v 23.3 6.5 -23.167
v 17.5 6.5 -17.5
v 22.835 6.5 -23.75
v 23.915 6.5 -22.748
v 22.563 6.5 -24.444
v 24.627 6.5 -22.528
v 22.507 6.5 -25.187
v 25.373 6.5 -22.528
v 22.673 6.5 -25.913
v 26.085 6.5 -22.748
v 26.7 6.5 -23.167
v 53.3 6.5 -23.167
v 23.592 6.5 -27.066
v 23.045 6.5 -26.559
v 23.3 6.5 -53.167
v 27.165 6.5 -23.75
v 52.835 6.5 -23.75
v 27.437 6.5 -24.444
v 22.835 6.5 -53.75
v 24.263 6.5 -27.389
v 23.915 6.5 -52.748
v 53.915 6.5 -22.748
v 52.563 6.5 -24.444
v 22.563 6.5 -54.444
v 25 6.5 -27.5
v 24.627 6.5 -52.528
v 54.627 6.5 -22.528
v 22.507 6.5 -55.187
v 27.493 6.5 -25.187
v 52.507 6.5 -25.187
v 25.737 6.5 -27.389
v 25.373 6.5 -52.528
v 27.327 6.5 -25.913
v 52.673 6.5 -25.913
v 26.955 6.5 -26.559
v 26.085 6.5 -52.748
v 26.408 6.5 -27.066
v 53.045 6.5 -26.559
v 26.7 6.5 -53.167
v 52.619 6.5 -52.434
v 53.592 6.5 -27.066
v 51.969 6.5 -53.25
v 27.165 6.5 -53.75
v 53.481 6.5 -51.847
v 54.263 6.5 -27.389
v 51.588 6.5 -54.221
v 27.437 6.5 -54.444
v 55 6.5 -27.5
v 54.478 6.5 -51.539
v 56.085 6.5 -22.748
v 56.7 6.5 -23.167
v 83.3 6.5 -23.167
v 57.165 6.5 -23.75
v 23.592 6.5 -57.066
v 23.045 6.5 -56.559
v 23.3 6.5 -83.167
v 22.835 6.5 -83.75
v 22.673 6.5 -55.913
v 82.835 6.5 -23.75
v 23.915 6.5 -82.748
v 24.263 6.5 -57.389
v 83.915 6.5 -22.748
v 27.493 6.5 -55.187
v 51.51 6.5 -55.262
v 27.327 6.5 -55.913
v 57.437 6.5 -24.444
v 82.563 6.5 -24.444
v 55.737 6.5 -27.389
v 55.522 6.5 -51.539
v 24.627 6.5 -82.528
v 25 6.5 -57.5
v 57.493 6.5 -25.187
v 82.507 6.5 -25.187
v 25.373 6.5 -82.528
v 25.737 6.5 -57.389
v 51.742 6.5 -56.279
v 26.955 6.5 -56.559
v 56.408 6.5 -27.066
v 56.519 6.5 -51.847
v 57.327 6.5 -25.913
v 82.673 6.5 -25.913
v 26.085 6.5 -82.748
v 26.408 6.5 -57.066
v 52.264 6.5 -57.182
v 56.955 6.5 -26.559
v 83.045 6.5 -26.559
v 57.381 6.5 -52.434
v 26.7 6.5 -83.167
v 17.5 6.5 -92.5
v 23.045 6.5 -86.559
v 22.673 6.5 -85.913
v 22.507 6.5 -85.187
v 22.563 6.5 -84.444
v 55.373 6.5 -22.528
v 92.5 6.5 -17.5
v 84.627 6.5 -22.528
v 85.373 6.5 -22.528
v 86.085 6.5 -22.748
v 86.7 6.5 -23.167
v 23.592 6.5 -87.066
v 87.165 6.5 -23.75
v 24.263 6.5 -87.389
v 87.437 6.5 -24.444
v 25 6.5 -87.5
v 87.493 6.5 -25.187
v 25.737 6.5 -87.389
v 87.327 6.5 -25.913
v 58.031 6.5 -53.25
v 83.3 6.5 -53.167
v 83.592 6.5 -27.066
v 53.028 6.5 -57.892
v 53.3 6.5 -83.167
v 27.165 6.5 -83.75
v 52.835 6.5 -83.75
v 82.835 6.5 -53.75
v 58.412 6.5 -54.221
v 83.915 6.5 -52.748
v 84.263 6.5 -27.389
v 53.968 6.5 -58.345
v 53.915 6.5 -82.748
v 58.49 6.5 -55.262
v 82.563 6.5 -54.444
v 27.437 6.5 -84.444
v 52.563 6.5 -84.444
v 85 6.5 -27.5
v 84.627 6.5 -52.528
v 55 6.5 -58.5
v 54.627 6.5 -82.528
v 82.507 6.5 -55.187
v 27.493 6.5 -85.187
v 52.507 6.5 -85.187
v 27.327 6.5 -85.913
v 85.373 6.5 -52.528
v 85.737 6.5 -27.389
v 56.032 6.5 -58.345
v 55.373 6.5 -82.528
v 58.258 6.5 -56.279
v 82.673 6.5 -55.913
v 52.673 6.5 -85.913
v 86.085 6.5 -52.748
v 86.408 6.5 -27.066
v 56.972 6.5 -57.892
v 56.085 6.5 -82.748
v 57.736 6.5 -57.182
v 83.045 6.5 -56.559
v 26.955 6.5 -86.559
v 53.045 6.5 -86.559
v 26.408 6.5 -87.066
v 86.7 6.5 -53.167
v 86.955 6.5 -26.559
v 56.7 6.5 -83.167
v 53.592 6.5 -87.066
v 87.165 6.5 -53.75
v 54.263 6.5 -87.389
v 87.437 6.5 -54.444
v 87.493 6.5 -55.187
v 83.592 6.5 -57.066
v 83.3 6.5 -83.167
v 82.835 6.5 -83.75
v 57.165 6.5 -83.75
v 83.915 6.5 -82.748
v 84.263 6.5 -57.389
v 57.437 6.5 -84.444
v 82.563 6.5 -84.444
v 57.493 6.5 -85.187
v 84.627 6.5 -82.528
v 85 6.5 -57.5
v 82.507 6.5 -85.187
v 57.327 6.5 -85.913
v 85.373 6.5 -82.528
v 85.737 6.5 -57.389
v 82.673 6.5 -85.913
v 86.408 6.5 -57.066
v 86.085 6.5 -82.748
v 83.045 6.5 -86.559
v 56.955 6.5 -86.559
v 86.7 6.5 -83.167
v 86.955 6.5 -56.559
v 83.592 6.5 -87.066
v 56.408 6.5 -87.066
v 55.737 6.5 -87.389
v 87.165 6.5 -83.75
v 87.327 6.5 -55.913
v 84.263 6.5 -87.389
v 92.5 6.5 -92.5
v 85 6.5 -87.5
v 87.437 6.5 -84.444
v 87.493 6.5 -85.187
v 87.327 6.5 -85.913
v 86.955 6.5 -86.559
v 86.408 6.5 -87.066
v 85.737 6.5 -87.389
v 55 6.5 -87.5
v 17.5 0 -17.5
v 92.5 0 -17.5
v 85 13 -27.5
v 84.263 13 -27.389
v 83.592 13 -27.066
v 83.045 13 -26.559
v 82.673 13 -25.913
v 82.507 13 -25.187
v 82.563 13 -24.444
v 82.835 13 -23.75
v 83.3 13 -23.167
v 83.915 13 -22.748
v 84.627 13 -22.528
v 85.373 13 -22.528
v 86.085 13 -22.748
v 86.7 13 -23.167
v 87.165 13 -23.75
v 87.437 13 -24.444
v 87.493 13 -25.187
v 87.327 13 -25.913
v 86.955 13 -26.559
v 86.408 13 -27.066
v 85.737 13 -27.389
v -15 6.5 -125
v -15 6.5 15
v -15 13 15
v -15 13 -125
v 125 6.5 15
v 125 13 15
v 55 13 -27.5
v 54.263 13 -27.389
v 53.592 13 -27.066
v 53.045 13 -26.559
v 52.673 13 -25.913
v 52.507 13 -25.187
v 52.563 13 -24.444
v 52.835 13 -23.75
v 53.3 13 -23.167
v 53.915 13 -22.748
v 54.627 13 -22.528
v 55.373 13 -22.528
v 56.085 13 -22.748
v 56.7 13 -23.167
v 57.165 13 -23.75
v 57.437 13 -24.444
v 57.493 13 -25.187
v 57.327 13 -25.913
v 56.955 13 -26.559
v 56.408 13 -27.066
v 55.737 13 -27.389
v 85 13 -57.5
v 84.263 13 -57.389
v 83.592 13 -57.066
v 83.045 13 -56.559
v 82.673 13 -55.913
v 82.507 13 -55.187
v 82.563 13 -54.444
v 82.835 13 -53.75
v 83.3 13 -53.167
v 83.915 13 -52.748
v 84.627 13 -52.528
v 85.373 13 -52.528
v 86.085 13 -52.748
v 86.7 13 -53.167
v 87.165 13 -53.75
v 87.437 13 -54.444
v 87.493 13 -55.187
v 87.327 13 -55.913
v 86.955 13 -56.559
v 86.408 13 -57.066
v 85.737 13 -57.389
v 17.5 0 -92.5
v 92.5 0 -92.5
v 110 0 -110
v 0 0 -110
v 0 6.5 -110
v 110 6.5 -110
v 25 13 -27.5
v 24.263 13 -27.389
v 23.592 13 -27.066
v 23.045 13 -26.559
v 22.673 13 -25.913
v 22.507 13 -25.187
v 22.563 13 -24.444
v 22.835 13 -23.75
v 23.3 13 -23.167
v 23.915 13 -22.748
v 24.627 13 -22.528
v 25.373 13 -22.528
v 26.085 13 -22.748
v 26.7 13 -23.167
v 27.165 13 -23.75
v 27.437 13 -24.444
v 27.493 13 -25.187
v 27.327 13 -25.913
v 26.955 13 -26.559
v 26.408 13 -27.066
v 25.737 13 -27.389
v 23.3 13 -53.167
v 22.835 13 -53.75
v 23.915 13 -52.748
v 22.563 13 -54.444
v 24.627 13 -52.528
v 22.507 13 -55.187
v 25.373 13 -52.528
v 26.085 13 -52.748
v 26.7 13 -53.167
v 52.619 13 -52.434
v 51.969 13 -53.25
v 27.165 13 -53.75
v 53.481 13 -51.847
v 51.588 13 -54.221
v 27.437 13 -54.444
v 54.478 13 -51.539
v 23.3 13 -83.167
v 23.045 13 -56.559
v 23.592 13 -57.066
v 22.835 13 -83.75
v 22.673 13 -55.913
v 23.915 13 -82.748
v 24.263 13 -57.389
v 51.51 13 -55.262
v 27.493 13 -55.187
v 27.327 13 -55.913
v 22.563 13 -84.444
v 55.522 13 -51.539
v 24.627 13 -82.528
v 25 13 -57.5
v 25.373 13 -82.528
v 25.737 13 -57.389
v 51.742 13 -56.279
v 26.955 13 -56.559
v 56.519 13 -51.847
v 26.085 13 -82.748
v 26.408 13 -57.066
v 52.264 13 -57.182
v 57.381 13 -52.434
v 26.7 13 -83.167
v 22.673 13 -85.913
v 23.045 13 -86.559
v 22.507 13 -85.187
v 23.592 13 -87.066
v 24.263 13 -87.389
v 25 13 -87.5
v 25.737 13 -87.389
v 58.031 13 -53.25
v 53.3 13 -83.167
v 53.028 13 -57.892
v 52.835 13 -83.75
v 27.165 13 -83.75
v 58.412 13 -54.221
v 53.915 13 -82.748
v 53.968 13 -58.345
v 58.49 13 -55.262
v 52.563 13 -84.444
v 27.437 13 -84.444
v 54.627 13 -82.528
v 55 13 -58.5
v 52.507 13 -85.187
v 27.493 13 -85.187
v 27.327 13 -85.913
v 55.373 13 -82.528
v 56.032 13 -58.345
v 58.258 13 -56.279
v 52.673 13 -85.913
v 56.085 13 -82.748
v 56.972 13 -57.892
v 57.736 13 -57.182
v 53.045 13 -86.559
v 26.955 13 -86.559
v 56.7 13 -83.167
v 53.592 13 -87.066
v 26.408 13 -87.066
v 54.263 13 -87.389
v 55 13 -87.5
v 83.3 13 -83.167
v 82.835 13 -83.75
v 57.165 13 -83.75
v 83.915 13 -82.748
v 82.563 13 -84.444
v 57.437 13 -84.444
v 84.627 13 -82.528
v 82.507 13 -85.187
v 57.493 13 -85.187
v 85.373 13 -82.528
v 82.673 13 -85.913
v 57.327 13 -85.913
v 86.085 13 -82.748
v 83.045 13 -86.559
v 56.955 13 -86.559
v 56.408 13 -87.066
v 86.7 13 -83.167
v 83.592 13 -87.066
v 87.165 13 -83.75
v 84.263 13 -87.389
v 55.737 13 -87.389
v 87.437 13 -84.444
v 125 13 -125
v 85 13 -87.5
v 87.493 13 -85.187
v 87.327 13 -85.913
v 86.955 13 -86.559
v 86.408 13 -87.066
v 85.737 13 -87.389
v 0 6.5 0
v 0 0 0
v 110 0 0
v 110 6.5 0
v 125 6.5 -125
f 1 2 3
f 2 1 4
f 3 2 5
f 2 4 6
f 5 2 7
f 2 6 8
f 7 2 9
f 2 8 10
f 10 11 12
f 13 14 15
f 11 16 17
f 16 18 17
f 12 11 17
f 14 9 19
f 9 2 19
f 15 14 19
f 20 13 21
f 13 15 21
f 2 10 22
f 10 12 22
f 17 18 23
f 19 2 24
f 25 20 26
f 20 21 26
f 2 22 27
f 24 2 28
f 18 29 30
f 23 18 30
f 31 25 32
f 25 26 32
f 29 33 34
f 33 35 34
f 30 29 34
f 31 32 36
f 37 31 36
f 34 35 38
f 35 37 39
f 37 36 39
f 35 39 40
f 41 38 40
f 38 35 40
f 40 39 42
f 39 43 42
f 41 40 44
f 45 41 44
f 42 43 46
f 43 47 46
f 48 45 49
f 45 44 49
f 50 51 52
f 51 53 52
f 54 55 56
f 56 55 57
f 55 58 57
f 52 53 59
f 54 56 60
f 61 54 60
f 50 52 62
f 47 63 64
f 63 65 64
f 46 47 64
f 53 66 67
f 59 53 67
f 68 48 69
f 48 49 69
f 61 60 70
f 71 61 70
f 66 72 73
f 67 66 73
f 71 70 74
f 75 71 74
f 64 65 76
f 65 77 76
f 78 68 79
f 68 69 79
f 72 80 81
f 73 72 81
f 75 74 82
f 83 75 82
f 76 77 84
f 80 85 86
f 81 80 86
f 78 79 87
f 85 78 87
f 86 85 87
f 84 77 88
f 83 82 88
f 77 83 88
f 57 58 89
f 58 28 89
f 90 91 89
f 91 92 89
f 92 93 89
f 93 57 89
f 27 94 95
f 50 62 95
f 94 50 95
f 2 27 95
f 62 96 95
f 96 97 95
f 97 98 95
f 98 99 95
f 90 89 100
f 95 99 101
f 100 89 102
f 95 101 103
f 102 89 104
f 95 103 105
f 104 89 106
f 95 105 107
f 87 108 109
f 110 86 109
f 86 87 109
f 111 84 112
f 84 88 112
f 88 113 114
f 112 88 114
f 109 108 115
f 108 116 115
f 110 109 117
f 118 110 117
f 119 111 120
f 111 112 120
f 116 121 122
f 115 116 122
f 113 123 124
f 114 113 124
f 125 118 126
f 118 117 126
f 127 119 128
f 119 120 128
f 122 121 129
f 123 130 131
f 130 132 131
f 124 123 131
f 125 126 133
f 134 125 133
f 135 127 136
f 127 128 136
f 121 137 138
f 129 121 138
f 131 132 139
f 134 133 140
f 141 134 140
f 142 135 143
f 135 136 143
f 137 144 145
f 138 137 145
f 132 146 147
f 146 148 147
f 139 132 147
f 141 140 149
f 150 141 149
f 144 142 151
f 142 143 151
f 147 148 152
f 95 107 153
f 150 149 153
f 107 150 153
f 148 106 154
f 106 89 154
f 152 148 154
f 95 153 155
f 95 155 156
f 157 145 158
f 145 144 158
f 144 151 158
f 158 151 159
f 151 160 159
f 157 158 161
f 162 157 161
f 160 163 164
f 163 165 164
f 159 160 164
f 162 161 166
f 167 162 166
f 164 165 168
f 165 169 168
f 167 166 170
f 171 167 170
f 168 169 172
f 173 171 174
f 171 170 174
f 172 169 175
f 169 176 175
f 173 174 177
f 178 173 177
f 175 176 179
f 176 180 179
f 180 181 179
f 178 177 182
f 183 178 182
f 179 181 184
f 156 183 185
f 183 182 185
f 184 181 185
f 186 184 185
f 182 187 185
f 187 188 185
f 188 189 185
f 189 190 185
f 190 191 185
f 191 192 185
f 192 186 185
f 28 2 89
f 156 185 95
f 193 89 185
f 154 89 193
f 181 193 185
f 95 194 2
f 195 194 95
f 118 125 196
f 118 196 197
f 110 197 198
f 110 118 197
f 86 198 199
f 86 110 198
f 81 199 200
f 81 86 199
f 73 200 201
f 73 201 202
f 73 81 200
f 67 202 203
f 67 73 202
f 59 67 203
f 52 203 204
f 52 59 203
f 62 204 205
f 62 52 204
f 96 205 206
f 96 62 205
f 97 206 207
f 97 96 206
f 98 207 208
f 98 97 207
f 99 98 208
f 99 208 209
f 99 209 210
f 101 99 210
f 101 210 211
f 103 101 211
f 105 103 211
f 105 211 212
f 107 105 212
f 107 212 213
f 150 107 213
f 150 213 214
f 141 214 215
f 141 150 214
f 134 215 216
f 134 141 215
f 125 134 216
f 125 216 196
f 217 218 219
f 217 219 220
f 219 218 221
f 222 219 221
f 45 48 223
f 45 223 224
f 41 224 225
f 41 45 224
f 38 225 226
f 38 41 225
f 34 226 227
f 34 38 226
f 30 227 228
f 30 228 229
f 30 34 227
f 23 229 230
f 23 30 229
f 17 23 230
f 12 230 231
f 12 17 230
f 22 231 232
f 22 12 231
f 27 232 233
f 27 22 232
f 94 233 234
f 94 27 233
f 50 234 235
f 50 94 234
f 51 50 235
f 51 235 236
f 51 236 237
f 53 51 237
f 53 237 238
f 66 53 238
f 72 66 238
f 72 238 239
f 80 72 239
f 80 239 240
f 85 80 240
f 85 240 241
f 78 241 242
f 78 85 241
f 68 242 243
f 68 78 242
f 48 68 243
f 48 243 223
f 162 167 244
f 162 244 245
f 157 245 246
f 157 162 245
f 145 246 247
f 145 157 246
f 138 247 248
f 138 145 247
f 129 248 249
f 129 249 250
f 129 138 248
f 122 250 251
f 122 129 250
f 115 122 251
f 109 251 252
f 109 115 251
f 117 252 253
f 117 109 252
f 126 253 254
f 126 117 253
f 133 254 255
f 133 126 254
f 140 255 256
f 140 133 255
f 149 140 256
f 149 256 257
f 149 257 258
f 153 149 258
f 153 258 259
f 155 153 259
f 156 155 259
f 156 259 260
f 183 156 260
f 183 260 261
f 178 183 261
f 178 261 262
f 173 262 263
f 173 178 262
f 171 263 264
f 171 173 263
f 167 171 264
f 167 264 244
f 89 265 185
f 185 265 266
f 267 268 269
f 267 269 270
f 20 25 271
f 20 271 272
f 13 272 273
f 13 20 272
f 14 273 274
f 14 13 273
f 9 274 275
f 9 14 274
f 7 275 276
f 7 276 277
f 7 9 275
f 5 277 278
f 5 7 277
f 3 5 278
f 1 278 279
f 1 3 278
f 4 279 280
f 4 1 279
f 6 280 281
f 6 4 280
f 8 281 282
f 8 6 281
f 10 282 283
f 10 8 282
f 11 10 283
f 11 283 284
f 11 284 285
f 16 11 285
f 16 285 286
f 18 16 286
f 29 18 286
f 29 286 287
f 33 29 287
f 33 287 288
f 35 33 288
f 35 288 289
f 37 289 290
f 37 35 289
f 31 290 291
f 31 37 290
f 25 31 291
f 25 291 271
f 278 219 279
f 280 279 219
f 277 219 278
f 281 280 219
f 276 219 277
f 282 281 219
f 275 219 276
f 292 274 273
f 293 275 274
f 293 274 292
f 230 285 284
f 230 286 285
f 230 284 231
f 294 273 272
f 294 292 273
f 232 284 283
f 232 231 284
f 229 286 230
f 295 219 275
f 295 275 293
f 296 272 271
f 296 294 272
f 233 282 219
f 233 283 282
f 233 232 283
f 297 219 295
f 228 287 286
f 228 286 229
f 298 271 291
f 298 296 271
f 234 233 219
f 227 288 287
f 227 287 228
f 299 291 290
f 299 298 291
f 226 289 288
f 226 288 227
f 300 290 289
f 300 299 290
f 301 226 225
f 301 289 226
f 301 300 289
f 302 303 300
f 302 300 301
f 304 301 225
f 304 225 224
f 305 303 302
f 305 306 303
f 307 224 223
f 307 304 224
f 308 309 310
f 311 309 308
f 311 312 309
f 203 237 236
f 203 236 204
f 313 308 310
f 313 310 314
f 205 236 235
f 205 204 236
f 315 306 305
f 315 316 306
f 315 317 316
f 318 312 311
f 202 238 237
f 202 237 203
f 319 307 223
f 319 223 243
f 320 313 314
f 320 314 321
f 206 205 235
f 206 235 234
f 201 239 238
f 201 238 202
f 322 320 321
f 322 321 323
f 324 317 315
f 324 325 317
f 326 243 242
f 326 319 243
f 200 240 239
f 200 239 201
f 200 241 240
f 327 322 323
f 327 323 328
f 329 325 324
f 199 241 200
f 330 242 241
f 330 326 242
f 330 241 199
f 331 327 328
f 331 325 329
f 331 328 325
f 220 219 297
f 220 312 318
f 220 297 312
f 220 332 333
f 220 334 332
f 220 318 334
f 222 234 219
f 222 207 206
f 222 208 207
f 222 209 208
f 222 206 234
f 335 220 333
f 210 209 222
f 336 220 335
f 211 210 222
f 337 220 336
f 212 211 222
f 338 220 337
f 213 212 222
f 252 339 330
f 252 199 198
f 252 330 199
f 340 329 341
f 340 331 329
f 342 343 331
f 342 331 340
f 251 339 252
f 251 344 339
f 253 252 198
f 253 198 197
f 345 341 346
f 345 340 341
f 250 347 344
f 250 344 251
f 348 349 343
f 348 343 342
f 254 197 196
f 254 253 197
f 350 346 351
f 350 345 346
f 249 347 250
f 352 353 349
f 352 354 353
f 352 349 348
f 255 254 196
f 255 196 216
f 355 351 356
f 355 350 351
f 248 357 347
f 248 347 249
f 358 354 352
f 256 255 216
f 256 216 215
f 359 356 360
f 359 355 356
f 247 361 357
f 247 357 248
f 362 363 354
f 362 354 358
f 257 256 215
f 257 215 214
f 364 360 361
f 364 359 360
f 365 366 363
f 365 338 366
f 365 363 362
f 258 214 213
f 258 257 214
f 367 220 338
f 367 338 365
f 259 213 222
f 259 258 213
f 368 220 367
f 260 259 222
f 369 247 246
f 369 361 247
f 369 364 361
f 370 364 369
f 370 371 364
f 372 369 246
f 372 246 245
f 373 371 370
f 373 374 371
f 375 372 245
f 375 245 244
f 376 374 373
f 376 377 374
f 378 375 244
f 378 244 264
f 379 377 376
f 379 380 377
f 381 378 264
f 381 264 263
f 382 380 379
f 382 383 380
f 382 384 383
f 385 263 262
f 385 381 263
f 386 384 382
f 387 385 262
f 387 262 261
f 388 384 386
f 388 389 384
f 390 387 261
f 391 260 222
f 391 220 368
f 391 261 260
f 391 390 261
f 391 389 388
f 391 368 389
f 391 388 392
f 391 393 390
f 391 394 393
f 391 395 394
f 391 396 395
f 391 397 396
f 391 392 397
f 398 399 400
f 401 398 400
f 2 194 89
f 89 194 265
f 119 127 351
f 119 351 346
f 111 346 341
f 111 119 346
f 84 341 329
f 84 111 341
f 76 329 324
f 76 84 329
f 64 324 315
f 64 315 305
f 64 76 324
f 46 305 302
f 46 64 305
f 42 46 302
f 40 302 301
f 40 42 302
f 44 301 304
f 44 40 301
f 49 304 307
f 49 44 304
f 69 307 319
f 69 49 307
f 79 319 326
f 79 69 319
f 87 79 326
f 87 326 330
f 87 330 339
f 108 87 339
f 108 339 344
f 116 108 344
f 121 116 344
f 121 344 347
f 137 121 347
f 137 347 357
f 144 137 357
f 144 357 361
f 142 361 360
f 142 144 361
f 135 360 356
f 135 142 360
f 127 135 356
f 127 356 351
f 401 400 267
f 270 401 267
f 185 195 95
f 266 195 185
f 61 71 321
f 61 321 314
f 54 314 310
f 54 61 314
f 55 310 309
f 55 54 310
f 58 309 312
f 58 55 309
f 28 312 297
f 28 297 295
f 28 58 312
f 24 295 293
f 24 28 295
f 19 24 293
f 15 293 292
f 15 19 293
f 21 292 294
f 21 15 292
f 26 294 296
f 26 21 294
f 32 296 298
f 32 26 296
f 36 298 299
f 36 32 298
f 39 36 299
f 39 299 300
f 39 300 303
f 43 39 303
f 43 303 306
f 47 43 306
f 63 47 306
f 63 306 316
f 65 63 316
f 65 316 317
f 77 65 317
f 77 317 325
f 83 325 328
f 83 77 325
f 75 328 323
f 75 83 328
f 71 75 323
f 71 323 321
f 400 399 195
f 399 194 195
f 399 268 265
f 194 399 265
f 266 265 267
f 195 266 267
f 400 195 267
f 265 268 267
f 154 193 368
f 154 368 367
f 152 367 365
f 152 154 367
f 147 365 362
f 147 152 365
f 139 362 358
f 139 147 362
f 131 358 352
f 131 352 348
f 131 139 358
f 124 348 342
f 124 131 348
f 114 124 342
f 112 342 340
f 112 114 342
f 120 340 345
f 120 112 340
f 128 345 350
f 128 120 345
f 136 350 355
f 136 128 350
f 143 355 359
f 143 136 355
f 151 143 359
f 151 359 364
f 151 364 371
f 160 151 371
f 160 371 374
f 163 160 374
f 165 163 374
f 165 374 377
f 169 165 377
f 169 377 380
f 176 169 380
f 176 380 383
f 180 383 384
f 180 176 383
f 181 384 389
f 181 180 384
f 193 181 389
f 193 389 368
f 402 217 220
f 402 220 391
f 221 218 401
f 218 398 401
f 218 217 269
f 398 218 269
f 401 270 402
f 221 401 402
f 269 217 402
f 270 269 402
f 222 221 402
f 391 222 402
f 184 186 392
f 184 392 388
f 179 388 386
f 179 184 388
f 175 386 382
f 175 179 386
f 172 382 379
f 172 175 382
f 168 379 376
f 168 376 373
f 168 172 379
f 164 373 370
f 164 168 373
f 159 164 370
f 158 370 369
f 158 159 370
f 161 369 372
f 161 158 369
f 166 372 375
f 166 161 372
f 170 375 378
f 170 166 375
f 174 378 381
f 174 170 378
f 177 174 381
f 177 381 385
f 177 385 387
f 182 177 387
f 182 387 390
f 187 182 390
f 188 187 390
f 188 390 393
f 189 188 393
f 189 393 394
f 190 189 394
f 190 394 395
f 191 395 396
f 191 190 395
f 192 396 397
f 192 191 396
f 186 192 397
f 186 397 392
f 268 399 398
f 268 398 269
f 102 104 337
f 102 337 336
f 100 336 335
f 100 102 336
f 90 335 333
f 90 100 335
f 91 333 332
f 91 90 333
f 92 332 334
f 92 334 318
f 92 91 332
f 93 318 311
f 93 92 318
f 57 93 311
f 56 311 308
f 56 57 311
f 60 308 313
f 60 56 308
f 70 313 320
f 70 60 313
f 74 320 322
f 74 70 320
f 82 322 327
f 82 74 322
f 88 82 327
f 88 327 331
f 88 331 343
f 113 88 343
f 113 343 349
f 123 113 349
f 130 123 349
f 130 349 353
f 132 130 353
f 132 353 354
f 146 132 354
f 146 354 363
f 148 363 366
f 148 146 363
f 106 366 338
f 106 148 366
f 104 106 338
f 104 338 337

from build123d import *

# Parameters (mm, degrees)
CROQUIS1_W              = 110
CROQUIS1_H              = 110
CROQUIS1_W_2            = 75
CROQUIS1_H_2            = 75
SALIENTE_EXTRUIR1_DEPTH = 6.5
CROQUIS2_W              = 140
CROQUIS2_H              = 140
CROQUIS2_R              = 3.5
CROQUIS2_R_2            = 2.5
SALIENTE_EXTRUIR2_DEPTH = 6.5


with BuildPart() as part:
    # Croquis1 → Saliente-Extruir1 (new body)
    with BuildSketch(Plane(origin=(0, 0, 0), x_dir=(1, 0, 0), z_dir=(0, 1, 0))):
        with Locations((55, 55)):
            Rectangle(CROQUIS1_W, CROQUIS1_H)
        with Locations((55, 55)):
            Rectangle(CROQUIS1_W_2, CROQUIS1_H_2, mode=Mode.SUBTRACT)
    extrude(amount=SALIENTE_EXTRUIR1_DEPTH)

    # Croquis2 → Saliente-Extruir2 (add)
    with BuildSketch(Plane(origin=(0, 6.5, 0), x_dir=(1, 0, 0), z_dir=(0, 1, 0))):
        with Locations((55, 55)):
            Rectangle(CROQUIS2_W, CROQUIS2_H)
        with Locations(Location((55, 55, 0), (0, 0, 90))):
            Circle(CROQUIS2_R, mode=Mode.SUBTRACT)
        with Locations(Location((25, 85, 0), (0, 0, 90))):
            Circle(CROQUIS2_R_2, mode=Mode.SUBTRACT)
        with Locations(Location((85, 85, 0), (0, 0, 90))):
            Circle(CROQUIS2_R_2, mode=Mode.SUBTRACT)
        with Locations(Location((85, 25, 0), (0, 0, 90))):
            Circle(CROQUIS2_R_2, mode=Mode.SUBTRACT)
        with Locations(Location((25, 25, 0), (0, 0, 90))):
            Circle(CROQUIS2_R_2, mode=Mode.SUBTRACT)
        with Locations(Location((55, 85, 0), (0, 0, 90))):
            Circle(CROQUIS2_R_2, mode=Mode.SUBTRACT)
        with Locations(Location((85, 55, 0), (0, 0, 90))):
            Circle(CROQUIS2_R_2, mode=Mode.SUBTRACT)
        with Locations(Location((55, 25, 0), (0, 0, 90))):
            Circle(CROQUIS2_R_2, mode=Mode.SUBTRACT)
        with Locations(Location((25, 55, 0), (0, 0, 90))):
            Circle(CROQUIS2_R_2, mode=Mode.SUBTRACT)
    extrude(amount=SALIENTE_EXTRUIR2_DEPTH)


solid = part.part
